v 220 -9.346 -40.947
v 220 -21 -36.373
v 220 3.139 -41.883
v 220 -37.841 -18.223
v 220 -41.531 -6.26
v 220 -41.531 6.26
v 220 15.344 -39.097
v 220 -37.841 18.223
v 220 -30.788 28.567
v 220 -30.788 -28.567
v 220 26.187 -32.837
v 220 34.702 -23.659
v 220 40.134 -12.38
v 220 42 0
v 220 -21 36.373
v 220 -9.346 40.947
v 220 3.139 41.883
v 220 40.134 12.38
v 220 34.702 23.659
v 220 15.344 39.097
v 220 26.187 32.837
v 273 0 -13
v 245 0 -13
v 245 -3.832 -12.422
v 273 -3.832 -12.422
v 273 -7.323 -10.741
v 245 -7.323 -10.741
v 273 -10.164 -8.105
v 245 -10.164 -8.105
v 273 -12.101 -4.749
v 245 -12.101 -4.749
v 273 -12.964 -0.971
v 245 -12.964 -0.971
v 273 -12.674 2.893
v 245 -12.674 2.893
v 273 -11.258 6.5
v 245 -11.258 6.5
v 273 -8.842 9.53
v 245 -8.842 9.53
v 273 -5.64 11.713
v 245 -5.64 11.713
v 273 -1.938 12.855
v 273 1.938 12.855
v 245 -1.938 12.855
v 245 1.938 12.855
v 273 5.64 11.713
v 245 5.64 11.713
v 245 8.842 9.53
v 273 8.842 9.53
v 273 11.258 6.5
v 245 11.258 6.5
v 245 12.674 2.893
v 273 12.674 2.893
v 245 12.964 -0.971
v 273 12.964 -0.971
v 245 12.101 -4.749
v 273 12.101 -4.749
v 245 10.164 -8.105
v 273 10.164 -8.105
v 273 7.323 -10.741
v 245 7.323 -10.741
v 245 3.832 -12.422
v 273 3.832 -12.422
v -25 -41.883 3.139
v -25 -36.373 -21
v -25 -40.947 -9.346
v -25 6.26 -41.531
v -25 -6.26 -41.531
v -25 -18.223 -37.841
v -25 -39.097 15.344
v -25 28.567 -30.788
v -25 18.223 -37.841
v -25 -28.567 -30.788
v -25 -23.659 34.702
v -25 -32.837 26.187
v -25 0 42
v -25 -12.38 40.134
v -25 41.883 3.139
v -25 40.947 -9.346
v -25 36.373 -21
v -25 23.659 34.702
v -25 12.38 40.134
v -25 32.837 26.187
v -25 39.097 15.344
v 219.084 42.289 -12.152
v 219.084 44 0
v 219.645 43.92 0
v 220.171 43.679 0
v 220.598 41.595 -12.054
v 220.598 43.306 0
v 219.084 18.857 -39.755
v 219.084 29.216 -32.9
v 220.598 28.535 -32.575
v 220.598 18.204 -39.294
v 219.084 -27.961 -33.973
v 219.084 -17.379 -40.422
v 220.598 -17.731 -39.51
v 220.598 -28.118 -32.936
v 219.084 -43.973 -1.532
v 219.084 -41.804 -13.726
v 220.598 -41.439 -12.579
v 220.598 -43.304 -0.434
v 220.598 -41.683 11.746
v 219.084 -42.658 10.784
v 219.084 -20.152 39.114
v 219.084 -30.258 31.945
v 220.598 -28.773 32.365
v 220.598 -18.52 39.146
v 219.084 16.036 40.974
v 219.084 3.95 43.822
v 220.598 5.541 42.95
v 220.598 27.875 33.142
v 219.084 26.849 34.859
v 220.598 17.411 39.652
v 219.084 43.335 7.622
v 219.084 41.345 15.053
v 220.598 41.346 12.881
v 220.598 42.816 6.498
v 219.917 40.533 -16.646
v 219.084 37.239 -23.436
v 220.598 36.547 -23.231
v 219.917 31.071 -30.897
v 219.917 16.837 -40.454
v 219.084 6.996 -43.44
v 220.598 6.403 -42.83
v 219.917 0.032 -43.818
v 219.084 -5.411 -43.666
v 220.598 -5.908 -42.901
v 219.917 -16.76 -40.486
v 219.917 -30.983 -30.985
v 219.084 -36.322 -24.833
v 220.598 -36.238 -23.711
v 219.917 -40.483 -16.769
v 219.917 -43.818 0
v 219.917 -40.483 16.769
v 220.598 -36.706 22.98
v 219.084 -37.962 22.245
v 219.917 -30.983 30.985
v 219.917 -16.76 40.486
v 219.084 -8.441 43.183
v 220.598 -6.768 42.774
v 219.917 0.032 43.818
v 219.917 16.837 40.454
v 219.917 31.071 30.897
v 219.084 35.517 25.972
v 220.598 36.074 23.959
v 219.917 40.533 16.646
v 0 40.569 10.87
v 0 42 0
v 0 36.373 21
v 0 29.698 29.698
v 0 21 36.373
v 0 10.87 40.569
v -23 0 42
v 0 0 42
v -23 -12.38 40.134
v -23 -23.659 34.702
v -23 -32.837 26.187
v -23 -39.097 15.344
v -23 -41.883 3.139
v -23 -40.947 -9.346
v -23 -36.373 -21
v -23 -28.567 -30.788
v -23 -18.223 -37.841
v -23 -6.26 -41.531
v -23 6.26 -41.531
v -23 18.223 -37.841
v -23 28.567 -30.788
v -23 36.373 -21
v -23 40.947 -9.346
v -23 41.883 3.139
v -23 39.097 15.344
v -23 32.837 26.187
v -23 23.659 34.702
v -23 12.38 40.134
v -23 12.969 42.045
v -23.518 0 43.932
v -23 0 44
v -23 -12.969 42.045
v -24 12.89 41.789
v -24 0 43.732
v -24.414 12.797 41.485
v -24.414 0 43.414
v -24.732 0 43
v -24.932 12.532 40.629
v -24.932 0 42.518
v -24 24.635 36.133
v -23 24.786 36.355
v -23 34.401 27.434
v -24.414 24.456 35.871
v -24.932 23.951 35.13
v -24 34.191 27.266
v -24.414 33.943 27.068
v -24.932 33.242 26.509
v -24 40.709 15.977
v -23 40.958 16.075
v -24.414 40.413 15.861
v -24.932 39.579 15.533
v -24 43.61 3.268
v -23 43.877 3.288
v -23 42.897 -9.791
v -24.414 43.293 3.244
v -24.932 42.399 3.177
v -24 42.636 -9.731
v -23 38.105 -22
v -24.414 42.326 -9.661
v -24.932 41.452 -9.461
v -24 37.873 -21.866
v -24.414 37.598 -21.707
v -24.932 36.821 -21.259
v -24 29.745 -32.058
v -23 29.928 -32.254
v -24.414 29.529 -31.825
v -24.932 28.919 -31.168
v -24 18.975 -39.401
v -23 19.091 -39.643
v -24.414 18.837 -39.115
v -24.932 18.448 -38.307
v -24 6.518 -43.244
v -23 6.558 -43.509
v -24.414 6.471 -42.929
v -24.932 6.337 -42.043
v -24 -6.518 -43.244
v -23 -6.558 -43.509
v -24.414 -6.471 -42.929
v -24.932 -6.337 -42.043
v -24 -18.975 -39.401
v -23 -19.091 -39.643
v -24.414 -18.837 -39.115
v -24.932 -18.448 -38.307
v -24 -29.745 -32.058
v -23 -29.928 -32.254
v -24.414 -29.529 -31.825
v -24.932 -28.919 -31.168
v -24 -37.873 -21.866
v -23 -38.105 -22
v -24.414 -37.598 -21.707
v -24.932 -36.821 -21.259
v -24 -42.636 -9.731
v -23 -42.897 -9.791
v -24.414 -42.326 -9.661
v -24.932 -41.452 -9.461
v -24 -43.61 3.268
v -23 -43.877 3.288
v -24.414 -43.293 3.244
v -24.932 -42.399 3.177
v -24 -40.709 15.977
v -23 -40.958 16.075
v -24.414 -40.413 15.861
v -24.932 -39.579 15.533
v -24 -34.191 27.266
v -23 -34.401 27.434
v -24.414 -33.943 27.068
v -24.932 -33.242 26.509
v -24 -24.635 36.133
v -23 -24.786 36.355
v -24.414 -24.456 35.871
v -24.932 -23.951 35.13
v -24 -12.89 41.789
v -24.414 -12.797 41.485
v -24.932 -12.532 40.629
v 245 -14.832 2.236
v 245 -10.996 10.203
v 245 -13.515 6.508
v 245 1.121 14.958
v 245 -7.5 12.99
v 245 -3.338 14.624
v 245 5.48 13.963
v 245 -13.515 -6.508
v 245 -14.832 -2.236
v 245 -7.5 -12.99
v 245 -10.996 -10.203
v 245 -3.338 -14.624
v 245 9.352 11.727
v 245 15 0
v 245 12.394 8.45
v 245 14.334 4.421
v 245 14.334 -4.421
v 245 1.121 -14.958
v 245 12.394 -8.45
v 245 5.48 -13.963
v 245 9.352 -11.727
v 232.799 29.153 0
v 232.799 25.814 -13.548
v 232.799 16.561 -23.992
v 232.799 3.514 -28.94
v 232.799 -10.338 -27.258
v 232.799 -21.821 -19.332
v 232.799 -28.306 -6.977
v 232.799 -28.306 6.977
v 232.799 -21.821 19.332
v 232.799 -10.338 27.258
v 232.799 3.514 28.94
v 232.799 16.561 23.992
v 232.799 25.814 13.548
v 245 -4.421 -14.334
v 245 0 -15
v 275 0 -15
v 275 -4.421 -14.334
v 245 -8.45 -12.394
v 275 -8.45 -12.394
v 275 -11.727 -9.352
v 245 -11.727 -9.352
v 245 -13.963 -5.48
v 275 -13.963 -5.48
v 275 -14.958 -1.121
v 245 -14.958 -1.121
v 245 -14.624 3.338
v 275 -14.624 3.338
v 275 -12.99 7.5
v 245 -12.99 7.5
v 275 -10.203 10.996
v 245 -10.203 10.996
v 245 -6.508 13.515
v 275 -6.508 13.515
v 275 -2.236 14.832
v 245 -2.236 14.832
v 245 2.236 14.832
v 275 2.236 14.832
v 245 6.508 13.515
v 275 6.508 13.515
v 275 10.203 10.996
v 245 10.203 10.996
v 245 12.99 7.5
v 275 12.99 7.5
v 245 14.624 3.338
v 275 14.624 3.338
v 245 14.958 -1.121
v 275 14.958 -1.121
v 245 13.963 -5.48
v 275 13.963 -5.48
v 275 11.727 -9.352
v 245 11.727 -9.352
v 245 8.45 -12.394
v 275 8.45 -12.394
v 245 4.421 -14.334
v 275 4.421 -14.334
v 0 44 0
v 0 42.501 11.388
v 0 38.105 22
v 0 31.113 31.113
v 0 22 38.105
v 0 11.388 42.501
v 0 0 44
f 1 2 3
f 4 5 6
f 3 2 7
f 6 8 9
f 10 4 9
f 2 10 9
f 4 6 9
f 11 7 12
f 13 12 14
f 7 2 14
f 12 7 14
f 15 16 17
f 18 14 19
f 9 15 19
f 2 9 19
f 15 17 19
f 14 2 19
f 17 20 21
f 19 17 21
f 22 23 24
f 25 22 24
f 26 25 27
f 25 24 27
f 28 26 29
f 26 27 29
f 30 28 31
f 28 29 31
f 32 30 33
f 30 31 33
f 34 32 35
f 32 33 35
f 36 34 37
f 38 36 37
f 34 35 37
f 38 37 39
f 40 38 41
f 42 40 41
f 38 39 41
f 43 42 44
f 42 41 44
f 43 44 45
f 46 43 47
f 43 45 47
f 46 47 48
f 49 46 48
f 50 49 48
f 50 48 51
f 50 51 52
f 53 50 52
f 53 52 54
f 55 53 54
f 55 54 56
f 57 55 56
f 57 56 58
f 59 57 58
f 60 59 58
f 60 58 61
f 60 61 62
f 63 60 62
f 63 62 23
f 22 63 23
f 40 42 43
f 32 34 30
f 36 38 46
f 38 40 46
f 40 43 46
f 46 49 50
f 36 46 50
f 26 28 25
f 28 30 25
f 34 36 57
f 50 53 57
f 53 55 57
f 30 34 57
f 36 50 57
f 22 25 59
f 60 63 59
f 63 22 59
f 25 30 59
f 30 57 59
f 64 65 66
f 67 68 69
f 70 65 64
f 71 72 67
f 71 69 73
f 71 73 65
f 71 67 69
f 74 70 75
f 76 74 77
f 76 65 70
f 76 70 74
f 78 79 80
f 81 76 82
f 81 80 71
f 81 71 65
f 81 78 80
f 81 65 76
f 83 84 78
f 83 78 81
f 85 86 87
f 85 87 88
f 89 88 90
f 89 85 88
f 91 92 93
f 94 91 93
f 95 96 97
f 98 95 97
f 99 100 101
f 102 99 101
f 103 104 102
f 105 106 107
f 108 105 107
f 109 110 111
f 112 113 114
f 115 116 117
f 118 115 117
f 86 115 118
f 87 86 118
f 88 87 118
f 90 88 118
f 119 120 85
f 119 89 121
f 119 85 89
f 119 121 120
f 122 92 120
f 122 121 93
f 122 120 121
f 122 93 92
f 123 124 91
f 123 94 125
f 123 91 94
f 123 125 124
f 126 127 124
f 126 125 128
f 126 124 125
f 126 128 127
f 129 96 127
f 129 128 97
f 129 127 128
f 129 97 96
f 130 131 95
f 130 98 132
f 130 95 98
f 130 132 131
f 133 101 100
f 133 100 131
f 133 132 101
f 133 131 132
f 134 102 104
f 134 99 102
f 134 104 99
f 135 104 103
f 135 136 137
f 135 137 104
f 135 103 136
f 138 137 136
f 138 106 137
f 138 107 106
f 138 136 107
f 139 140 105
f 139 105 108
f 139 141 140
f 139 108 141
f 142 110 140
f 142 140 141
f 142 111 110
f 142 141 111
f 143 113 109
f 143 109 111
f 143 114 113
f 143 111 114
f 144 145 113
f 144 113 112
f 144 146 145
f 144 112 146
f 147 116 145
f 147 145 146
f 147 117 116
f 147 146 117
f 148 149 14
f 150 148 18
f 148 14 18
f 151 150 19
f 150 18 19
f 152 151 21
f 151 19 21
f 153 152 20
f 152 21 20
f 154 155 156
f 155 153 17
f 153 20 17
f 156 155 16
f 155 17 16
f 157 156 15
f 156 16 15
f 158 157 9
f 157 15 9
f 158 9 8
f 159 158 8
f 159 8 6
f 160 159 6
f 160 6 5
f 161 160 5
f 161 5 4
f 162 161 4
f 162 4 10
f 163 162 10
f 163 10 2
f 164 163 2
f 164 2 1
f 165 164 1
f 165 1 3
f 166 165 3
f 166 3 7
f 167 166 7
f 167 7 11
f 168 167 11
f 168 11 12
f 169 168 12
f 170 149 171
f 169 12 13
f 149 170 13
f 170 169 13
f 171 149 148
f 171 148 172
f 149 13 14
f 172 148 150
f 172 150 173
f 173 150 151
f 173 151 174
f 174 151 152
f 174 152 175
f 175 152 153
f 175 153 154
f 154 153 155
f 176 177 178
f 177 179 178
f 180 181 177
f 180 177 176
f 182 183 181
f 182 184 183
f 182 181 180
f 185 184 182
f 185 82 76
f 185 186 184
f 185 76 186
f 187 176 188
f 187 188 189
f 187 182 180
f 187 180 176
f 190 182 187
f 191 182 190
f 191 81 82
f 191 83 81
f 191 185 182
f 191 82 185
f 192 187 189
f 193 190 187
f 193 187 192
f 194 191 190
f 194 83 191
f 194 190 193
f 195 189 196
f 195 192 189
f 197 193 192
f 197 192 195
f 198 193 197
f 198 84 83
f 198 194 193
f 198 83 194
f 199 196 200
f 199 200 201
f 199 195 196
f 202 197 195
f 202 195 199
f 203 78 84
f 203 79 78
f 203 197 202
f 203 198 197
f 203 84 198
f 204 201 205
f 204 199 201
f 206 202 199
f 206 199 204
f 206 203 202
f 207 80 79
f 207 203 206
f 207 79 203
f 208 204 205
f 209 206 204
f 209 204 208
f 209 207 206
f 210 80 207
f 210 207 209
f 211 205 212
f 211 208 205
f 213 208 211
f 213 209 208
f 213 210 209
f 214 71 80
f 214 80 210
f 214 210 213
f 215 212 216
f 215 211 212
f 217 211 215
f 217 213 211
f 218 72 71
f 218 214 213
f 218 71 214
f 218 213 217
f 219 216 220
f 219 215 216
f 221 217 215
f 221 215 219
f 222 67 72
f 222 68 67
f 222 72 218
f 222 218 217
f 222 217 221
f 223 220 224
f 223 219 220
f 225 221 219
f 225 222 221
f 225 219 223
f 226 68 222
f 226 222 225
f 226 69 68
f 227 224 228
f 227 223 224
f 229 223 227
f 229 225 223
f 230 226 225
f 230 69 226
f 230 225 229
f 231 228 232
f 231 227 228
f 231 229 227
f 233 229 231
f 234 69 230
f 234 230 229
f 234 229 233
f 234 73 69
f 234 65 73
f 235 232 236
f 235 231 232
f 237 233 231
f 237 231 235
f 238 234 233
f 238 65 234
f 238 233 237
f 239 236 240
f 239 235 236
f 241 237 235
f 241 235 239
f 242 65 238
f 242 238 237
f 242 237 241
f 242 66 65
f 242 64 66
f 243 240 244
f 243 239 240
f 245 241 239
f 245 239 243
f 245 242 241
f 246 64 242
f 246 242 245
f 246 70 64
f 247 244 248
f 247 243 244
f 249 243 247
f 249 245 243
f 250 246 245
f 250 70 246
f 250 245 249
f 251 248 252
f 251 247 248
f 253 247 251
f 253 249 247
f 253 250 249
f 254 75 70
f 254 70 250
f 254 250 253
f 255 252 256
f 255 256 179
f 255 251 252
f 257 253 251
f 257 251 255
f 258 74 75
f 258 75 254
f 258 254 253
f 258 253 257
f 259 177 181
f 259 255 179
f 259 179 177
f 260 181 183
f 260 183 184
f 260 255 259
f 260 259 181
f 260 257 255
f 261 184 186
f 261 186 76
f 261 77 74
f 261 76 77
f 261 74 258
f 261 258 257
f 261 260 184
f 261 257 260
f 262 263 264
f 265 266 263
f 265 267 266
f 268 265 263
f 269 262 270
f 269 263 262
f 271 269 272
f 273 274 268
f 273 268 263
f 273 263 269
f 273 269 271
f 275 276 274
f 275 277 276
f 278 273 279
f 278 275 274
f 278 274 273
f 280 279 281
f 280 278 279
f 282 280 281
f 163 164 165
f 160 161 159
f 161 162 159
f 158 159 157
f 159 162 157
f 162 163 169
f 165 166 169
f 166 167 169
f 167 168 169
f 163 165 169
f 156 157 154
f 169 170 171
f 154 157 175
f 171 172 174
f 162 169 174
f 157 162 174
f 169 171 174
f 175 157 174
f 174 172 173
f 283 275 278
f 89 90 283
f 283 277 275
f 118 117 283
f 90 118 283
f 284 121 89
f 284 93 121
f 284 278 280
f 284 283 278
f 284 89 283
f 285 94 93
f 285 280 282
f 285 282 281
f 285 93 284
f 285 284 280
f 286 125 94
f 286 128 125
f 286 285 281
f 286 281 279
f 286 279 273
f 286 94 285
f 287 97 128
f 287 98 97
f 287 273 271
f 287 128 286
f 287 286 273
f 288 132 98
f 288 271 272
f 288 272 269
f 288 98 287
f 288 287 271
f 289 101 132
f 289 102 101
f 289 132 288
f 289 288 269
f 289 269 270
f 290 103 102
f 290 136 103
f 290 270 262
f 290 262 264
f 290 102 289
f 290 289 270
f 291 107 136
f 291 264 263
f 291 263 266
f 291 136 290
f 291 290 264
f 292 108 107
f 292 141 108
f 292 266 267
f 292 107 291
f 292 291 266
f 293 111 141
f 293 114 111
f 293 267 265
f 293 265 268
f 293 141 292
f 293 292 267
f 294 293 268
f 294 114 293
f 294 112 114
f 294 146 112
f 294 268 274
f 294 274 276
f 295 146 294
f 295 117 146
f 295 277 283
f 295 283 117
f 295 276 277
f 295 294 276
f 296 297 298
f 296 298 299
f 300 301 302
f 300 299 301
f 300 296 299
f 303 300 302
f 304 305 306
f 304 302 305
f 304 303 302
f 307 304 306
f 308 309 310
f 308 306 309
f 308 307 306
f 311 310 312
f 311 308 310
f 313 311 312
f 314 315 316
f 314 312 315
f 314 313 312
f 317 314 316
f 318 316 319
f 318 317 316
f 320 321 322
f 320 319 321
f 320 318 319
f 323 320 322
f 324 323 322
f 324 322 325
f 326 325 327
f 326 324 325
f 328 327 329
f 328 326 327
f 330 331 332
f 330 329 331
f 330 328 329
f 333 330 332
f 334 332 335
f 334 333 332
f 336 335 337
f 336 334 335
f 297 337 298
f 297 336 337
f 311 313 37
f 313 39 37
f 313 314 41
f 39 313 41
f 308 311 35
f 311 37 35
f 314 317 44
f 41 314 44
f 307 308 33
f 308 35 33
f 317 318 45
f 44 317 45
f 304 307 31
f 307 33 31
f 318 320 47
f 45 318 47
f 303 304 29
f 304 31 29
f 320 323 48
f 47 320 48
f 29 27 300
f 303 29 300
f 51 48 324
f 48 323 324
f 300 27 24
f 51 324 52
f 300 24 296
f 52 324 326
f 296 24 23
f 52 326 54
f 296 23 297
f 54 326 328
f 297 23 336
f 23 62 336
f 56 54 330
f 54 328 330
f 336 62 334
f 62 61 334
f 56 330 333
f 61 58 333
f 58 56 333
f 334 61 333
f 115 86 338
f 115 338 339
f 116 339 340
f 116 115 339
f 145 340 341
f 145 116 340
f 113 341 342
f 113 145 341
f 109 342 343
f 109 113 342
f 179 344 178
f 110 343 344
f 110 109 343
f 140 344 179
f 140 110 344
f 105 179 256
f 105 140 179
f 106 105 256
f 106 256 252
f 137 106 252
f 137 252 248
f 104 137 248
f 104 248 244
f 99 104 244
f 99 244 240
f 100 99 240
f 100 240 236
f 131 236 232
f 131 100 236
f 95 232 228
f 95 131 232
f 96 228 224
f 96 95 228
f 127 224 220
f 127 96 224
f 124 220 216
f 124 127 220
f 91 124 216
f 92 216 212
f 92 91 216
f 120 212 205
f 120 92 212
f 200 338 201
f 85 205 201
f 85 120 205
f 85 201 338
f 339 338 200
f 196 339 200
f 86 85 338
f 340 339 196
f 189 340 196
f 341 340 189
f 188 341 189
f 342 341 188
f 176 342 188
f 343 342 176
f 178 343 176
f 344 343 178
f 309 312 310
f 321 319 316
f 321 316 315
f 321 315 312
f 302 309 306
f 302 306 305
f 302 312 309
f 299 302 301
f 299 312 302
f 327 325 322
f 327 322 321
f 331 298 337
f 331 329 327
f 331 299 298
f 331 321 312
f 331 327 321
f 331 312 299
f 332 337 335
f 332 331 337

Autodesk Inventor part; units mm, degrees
ref_plane "YZ Plane" through (0, 0, 0) normal (1, 0, 0) x (0, 1, 0)
ref_plane "XZ Plane" through (0, 0, 0) normal (0, 1, 0) x (-1, 0, 0)
sketch "スケッチ4" plane through (0, 0, 0) normal (1, 0, 0) x (0, 1, 0)
  circle A0 centre (0, 0) radius 44
  circle A1 centre (0, 0) radius 42
  dimension "d6" = 88
  dimension "d7" = 2
extrude "押し出し3" add sketch "スケッチ4" along normal blind 220
ref_plane "作業平面1" through (245, 0, 0) normal (1, 0, 0) x (0, 0, -1)
sketch "スケッチ5" plane through (245, 0, 0) normal (1, 0, 0) x (0, 0, -1)
  circle A0 centre (0, 0) radius 15
  circle A1 centre (0, 0) radius 13
  dimension "d11" = 30
  dimension "d12" = 2
extrude "押し出し4" add sketch "スケッチ5" along normal blind 30 separate body
sketch "スケッチ6" plane through (275, 0, 0) normal (1, 0, 0) x (0, 0, -1)
  circle A0 centre (0, 0) radius 15
extrude "押し出し5" add sketch "スケッチ6" against normal blind 2 bodies 2
loft "ロフト2" add bodies 1 section 1 edges at (220, -44, 0) section 2 edges at (245, 0, 15)
fillet "フィレット1" radius 2 1 edges at (220, -44, 0)
sketch "スケッチ7" plane through (0, 0, 0) normal (-1, 0, 0) x (0, 0, 1)
  circle A0 centre (0, 0) radius 44
  circle A1 centre (0, 0) radius 42
extrude "押し出し6" add sketch "スケッチ7" along normal blind 25 bodies 1
sketch "スケッチ8" plane through (-25, 0, 0) normal (-1, 0, 0) x (0, 0, 1)
  circle A0 centre (0, 0) radius 44
extrude "押し出し7" add sketch "スケッチ8" against normal blind 2 bodies 1
fillet "フィレット2" radius 2 1 edges at (-25, 0, -44)
properties part number "roller-Base-v1-petbottle" material "PET プラスチック"
